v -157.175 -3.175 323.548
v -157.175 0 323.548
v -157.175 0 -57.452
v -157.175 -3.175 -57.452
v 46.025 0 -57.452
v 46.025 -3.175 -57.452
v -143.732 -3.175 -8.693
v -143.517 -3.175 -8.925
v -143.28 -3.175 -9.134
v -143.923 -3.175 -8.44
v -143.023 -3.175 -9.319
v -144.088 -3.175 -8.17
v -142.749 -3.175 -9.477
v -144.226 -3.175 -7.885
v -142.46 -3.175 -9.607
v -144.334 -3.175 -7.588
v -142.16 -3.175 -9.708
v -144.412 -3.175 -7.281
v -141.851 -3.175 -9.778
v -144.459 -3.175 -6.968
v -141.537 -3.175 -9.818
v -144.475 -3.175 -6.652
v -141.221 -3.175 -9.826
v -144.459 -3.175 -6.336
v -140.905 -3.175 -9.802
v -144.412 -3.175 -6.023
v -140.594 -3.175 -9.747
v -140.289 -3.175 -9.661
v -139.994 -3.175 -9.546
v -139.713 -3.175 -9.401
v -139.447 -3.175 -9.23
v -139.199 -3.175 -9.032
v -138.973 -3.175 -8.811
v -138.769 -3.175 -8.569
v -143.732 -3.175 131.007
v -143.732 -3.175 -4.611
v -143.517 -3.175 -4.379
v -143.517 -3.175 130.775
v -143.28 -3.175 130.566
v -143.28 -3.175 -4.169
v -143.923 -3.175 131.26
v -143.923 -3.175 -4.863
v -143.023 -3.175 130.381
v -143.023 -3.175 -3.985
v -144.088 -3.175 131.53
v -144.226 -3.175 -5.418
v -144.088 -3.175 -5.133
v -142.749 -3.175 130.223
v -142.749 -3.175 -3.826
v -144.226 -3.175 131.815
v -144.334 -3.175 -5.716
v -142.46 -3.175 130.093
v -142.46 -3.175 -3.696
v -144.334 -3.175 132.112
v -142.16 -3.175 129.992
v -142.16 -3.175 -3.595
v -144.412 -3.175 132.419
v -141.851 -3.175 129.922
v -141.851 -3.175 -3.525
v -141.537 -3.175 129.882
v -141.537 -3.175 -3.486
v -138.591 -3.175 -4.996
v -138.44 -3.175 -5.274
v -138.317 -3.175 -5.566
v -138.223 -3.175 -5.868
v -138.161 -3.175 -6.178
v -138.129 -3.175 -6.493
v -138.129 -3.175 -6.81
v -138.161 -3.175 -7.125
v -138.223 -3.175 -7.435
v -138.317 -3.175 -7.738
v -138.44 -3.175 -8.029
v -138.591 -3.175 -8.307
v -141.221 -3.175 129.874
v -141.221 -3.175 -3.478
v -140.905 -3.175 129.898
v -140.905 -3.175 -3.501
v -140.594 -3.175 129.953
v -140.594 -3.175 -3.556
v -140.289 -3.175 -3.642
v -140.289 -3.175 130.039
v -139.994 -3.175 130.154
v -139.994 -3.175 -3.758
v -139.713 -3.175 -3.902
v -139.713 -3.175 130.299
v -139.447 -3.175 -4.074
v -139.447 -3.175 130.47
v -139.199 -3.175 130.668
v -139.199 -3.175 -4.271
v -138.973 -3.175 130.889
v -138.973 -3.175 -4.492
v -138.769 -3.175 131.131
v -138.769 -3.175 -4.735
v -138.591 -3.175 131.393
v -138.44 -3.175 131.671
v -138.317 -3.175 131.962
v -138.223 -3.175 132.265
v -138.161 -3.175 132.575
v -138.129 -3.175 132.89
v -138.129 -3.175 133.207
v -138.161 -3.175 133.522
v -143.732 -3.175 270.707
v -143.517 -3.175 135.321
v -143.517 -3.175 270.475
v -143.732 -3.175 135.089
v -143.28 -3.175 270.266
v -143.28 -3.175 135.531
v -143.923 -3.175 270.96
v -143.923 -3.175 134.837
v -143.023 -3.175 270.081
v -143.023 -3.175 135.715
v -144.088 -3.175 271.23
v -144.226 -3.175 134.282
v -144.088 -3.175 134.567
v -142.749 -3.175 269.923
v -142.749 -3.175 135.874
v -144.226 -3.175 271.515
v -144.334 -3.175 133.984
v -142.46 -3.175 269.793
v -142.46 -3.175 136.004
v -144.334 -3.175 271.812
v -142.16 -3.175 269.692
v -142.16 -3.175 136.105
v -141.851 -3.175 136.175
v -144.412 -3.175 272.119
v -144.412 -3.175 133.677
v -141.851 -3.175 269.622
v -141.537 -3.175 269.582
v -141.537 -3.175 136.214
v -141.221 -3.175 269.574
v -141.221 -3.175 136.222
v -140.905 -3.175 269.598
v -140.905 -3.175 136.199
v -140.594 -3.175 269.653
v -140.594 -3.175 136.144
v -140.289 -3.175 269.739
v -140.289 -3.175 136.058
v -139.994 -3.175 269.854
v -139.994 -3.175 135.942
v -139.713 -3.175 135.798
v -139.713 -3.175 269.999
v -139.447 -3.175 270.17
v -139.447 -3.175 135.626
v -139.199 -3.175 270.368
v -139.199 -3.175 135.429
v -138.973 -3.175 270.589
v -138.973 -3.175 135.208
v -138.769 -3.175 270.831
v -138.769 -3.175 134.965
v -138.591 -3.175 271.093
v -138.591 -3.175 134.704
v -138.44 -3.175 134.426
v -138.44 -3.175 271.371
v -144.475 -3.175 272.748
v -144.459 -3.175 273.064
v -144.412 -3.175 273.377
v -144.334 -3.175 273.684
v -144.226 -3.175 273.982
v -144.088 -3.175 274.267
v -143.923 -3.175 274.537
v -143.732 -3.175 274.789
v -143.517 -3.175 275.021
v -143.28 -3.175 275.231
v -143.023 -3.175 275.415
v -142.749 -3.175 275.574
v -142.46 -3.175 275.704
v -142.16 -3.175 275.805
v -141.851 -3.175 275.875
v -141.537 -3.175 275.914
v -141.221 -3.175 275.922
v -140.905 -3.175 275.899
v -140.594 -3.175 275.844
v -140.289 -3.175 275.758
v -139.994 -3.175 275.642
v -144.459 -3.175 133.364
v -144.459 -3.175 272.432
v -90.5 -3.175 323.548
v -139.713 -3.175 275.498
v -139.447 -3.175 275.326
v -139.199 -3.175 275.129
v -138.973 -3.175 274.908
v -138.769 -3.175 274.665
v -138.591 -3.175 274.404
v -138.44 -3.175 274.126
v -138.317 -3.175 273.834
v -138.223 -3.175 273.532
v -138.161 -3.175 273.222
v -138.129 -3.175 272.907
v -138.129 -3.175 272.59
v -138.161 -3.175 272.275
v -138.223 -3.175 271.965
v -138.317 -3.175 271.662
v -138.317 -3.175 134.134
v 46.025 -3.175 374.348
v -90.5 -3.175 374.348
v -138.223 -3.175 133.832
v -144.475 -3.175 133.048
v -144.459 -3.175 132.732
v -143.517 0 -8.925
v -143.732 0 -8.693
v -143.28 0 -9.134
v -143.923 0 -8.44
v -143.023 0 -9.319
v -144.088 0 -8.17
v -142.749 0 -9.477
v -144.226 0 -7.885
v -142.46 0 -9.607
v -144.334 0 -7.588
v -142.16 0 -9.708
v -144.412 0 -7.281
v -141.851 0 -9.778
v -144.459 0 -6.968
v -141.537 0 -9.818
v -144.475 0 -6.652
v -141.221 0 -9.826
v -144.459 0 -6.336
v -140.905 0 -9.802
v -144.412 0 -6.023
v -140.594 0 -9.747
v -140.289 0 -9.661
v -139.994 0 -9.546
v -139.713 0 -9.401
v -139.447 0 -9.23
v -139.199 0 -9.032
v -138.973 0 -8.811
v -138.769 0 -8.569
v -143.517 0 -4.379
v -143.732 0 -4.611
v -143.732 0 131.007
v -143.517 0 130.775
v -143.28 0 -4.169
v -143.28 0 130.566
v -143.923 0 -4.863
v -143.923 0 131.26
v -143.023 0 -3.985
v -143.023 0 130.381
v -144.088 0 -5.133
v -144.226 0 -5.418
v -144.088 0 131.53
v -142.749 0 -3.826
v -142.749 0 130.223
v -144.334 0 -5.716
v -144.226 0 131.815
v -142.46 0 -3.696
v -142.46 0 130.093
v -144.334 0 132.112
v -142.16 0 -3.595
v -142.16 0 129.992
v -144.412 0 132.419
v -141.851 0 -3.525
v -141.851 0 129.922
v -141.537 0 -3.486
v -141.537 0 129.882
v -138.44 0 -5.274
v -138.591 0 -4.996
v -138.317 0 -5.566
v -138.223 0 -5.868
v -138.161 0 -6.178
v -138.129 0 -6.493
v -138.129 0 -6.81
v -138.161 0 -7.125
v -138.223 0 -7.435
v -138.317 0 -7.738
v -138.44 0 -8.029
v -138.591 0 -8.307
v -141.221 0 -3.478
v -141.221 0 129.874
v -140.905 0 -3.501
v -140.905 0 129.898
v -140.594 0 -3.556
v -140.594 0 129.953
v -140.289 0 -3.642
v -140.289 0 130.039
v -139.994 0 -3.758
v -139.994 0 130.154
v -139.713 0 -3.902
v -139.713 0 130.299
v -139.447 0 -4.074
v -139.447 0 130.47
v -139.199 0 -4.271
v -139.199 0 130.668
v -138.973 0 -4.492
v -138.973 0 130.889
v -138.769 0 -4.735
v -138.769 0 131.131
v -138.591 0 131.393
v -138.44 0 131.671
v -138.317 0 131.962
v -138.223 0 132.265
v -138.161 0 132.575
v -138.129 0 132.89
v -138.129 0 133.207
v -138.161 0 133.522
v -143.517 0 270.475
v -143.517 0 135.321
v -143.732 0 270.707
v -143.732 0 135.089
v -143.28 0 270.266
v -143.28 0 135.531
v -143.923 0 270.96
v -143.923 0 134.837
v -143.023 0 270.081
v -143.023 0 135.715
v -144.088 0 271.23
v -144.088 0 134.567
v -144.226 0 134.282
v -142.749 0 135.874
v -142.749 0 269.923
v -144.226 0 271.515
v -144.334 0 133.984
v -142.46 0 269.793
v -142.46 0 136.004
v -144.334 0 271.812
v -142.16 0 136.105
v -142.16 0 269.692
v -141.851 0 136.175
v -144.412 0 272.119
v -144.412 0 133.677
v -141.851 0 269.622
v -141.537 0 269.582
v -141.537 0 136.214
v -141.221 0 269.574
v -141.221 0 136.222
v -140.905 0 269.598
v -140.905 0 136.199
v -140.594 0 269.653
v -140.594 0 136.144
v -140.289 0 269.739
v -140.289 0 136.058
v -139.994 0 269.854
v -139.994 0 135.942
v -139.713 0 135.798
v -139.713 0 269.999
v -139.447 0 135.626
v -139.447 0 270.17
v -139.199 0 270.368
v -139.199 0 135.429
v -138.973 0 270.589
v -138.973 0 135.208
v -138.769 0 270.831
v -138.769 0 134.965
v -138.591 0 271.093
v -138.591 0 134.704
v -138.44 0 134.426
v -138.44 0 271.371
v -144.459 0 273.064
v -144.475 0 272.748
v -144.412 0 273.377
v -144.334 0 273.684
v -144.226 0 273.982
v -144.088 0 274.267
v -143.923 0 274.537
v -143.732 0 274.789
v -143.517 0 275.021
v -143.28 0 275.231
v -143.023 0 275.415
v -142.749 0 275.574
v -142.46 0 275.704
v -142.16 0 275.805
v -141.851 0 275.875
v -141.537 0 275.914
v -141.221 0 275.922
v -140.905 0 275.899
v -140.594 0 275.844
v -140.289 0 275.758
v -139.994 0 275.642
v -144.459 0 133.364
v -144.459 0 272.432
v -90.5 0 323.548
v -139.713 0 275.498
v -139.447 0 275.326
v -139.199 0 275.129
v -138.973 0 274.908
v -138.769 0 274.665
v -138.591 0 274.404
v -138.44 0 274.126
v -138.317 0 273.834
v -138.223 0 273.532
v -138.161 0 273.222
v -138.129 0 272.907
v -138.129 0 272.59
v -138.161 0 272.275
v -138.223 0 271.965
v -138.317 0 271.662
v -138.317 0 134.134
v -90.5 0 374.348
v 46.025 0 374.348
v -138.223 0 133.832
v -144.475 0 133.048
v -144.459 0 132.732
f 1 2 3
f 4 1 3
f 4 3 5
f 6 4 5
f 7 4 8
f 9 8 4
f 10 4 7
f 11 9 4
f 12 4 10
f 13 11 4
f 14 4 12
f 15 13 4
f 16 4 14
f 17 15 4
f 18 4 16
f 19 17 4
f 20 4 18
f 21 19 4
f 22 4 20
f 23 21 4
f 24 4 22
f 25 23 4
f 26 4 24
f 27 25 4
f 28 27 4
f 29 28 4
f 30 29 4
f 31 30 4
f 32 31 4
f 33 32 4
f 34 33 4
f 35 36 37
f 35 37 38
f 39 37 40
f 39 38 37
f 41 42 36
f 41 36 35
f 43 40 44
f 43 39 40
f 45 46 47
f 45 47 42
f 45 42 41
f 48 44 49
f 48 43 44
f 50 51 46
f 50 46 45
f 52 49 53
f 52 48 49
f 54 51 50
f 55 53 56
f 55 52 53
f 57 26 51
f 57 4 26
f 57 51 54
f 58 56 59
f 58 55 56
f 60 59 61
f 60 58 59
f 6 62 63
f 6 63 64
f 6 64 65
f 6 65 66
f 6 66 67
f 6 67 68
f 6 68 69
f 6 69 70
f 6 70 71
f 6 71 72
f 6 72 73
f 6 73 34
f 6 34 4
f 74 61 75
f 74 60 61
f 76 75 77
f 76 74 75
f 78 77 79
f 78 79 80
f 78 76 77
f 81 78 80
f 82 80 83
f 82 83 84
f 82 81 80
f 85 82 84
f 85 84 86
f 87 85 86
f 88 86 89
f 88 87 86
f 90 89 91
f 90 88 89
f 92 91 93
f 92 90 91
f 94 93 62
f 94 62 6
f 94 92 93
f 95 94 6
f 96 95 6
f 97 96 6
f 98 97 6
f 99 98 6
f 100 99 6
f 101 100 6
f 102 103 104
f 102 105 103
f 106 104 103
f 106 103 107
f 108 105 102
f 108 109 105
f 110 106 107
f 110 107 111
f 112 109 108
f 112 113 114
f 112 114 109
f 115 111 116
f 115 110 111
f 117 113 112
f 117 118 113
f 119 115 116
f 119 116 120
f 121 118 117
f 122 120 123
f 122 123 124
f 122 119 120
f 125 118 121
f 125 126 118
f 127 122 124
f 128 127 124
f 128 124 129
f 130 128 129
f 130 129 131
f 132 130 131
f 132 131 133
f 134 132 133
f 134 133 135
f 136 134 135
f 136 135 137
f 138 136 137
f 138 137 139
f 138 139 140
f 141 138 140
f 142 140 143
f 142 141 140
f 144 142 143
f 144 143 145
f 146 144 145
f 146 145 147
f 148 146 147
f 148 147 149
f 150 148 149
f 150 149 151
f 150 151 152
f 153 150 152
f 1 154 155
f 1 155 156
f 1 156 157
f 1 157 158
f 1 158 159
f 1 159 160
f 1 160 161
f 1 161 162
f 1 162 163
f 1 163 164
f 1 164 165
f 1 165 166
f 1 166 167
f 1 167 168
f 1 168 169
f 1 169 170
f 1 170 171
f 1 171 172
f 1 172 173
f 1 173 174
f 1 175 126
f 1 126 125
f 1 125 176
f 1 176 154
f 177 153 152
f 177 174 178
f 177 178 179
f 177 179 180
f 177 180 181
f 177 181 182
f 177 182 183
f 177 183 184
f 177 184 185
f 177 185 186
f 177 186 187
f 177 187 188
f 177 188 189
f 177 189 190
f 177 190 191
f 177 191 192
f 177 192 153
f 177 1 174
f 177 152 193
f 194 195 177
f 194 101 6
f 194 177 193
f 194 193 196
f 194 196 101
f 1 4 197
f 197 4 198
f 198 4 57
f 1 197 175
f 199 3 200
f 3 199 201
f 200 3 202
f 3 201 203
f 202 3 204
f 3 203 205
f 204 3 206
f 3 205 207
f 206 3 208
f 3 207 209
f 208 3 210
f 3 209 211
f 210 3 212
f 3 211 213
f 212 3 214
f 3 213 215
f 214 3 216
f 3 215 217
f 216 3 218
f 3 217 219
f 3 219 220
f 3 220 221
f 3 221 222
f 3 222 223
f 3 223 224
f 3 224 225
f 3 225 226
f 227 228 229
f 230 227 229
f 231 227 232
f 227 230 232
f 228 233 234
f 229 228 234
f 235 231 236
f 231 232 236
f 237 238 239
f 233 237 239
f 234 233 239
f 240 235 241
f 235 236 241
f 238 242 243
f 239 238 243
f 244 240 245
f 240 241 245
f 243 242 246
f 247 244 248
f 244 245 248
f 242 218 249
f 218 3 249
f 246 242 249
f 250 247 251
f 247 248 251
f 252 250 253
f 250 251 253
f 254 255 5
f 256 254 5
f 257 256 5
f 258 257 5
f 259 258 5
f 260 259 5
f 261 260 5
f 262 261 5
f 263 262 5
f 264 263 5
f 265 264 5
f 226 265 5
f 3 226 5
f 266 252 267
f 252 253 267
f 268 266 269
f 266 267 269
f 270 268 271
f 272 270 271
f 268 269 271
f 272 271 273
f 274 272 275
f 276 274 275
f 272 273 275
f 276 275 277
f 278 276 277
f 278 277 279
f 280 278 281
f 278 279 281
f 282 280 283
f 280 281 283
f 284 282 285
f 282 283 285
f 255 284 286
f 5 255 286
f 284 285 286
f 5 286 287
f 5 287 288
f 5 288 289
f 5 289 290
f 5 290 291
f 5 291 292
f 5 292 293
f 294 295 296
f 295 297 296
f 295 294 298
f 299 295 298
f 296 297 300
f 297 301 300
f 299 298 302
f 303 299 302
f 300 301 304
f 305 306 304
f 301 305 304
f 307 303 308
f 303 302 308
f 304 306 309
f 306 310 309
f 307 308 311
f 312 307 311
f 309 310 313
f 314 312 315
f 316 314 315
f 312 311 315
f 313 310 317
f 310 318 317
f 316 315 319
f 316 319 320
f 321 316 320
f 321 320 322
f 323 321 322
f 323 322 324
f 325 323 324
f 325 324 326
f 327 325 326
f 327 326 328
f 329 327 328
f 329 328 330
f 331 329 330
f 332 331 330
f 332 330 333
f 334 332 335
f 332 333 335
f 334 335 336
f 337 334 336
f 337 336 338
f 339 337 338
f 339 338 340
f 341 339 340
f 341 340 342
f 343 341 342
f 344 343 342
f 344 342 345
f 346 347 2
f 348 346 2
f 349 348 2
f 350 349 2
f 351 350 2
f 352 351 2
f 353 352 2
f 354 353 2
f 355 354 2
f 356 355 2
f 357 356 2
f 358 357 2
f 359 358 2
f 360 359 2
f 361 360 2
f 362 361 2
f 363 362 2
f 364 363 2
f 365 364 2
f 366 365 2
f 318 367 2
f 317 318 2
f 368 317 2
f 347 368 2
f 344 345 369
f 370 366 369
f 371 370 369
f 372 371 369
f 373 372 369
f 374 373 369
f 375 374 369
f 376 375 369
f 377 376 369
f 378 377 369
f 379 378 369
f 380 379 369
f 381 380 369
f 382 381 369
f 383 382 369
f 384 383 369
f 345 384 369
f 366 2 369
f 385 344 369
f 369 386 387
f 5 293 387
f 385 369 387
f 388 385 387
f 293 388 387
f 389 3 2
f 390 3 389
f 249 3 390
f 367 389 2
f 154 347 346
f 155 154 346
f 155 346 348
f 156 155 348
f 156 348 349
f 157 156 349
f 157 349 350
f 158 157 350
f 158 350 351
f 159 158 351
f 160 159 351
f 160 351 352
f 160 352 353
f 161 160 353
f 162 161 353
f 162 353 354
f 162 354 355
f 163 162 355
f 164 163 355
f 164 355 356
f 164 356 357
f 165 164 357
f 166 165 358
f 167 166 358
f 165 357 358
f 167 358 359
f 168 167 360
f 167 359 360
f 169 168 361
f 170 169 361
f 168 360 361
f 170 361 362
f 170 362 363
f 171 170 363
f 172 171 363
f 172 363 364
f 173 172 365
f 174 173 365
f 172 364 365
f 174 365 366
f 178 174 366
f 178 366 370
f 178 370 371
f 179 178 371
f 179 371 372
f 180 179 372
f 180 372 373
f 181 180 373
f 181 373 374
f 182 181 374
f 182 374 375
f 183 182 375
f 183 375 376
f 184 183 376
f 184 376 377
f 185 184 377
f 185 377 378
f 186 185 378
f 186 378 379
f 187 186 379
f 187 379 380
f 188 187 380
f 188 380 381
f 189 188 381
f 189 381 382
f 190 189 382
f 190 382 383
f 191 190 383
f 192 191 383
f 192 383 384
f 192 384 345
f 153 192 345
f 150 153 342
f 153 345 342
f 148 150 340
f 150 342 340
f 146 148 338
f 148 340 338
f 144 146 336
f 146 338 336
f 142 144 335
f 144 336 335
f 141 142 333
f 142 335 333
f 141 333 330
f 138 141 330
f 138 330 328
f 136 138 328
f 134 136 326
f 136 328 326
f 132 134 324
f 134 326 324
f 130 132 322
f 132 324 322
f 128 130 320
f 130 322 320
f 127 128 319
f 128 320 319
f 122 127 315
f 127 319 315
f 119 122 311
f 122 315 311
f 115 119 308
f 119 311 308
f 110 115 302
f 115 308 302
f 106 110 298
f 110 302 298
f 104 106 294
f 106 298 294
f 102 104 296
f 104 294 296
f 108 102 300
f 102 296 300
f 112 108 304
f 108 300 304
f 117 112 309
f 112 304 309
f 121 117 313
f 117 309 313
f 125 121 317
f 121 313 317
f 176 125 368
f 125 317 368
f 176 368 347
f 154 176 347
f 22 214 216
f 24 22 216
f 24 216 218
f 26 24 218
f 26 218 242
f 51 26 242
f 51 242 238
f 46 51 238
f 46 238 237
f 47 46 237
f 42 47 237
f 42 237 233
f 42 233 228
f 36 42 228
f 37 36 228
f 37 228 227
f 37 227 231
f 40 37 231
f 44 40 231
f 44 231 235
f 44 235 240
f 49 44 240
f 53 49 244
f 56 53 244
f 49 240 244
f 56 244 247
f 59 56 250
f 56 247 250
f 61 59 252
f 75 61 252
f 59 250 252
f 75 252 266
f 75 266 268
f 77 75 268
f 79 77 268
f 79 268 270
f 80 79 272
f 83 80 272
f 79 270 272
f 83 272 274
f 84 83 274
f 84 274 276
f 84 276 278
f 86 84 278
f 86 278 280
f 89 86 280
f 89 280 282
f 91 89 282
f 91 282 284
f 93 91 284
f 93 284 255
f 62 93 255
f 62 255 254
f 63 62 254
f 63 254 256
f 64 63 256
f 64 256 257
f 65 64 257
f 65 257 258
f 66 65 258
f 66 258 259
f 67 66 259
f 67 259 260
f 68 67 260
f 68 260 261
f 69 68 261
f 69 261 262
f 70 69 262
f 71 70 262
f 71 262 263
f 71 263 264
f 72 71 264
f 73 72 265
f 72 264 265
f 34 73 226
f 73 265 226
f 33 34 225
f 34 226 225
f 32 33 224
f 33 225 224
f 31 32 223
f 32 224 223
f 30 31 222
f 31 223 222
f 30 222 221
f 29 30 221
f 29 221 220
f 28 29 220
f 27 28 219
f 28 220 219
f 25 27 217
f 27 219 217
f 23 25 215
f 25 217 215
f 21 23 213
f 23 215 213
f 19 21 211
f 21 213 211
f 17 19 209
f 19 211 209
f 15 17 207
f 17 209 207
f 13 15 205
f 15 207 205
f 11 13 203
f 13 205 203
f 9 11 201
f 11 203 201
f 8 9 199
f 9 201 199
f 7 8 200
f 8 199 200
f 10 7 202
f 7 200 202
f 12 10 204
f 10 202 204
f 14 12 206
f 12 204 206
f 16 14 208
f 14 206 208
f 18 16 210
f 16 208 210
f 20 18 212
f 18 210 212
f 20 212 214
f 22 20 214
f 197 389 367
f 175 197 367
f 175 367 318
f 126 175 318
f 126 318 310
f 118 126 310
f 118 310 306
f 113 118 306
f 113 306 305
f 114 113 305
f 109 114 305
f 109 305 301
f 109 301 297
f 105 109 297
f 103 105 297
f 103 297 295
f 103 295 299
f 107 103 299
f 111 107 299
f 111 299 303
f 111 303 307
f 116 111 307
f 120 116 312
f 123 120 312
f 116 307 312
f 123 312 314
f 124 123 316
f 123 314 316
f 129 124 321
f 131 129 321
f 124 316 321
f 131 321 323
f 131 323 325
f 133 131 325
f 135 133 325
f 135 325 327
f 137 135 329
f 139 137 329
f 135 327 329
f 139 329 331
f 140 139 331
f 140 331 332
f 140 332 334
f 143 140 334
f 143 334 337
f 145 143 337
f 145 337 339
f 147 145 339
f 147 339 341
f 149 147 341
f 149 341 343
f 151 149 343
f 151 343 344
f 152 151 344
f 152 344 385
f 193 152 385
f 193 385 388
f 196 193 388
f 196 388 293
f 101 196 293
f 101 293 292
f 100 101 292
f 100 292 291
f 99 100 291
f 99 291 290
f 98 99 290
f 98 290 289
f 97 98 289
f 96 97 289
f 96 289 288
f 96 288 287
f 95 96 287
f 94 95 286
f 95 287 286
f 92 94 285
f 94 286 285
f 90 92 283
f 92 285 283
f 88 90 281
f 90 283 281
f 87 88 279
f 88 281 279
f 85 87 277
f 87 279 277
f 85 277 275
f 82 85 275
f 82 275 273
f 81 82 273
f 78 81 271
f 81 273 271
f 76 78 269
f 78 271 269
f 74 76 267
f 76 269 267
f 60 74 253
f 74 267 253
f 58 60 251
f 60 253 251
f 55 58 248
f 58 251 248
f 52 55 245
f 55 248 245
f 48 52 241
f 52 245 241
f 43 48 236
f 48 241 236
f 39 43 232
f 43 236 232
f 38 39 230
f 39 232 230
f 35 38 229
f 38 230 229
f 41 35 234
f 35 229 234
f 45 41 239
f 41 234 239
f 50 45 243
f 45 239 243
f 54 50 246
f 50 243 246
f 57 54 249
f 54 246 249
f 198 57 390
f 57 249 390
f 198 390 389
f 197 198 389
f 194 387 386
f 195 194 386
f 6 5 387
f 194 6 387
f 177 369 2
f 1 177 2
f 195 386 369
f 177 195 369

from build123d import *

# Parameters (mm, degrees)
F1_DEPTH = 3.175
F3_D     = 6.35
F4_D     = 6.35


with BuildPart() as f1:
    # F0 (on Front) → F1 (new body)
    with BuildSketch(Plane.XZ):
        Polygon((-157.175134, 323.548309), (-157.175134, -57.451691), (46.024866, -57.451691), (46.024866, 374.348309), (-90.500134, 374.348309), (-90.500134, 323.548309), align=None)
    extrude(amount=F1_DEPTH)

    # F3 (through all)
    with Locations(Plane.XZ.offset(3.175)):
        with Locations((-141.300134, -6.651691)):
            Hole(F3_D / 2)

    # F4 (through all)
    with Locations(Plane.XZ.offset(3.175)):
        with Locations((-141.300134, 133.048309), (-141.300134, 272.748309)):
            Hole(F4_D / 2)


solid = f1.part
